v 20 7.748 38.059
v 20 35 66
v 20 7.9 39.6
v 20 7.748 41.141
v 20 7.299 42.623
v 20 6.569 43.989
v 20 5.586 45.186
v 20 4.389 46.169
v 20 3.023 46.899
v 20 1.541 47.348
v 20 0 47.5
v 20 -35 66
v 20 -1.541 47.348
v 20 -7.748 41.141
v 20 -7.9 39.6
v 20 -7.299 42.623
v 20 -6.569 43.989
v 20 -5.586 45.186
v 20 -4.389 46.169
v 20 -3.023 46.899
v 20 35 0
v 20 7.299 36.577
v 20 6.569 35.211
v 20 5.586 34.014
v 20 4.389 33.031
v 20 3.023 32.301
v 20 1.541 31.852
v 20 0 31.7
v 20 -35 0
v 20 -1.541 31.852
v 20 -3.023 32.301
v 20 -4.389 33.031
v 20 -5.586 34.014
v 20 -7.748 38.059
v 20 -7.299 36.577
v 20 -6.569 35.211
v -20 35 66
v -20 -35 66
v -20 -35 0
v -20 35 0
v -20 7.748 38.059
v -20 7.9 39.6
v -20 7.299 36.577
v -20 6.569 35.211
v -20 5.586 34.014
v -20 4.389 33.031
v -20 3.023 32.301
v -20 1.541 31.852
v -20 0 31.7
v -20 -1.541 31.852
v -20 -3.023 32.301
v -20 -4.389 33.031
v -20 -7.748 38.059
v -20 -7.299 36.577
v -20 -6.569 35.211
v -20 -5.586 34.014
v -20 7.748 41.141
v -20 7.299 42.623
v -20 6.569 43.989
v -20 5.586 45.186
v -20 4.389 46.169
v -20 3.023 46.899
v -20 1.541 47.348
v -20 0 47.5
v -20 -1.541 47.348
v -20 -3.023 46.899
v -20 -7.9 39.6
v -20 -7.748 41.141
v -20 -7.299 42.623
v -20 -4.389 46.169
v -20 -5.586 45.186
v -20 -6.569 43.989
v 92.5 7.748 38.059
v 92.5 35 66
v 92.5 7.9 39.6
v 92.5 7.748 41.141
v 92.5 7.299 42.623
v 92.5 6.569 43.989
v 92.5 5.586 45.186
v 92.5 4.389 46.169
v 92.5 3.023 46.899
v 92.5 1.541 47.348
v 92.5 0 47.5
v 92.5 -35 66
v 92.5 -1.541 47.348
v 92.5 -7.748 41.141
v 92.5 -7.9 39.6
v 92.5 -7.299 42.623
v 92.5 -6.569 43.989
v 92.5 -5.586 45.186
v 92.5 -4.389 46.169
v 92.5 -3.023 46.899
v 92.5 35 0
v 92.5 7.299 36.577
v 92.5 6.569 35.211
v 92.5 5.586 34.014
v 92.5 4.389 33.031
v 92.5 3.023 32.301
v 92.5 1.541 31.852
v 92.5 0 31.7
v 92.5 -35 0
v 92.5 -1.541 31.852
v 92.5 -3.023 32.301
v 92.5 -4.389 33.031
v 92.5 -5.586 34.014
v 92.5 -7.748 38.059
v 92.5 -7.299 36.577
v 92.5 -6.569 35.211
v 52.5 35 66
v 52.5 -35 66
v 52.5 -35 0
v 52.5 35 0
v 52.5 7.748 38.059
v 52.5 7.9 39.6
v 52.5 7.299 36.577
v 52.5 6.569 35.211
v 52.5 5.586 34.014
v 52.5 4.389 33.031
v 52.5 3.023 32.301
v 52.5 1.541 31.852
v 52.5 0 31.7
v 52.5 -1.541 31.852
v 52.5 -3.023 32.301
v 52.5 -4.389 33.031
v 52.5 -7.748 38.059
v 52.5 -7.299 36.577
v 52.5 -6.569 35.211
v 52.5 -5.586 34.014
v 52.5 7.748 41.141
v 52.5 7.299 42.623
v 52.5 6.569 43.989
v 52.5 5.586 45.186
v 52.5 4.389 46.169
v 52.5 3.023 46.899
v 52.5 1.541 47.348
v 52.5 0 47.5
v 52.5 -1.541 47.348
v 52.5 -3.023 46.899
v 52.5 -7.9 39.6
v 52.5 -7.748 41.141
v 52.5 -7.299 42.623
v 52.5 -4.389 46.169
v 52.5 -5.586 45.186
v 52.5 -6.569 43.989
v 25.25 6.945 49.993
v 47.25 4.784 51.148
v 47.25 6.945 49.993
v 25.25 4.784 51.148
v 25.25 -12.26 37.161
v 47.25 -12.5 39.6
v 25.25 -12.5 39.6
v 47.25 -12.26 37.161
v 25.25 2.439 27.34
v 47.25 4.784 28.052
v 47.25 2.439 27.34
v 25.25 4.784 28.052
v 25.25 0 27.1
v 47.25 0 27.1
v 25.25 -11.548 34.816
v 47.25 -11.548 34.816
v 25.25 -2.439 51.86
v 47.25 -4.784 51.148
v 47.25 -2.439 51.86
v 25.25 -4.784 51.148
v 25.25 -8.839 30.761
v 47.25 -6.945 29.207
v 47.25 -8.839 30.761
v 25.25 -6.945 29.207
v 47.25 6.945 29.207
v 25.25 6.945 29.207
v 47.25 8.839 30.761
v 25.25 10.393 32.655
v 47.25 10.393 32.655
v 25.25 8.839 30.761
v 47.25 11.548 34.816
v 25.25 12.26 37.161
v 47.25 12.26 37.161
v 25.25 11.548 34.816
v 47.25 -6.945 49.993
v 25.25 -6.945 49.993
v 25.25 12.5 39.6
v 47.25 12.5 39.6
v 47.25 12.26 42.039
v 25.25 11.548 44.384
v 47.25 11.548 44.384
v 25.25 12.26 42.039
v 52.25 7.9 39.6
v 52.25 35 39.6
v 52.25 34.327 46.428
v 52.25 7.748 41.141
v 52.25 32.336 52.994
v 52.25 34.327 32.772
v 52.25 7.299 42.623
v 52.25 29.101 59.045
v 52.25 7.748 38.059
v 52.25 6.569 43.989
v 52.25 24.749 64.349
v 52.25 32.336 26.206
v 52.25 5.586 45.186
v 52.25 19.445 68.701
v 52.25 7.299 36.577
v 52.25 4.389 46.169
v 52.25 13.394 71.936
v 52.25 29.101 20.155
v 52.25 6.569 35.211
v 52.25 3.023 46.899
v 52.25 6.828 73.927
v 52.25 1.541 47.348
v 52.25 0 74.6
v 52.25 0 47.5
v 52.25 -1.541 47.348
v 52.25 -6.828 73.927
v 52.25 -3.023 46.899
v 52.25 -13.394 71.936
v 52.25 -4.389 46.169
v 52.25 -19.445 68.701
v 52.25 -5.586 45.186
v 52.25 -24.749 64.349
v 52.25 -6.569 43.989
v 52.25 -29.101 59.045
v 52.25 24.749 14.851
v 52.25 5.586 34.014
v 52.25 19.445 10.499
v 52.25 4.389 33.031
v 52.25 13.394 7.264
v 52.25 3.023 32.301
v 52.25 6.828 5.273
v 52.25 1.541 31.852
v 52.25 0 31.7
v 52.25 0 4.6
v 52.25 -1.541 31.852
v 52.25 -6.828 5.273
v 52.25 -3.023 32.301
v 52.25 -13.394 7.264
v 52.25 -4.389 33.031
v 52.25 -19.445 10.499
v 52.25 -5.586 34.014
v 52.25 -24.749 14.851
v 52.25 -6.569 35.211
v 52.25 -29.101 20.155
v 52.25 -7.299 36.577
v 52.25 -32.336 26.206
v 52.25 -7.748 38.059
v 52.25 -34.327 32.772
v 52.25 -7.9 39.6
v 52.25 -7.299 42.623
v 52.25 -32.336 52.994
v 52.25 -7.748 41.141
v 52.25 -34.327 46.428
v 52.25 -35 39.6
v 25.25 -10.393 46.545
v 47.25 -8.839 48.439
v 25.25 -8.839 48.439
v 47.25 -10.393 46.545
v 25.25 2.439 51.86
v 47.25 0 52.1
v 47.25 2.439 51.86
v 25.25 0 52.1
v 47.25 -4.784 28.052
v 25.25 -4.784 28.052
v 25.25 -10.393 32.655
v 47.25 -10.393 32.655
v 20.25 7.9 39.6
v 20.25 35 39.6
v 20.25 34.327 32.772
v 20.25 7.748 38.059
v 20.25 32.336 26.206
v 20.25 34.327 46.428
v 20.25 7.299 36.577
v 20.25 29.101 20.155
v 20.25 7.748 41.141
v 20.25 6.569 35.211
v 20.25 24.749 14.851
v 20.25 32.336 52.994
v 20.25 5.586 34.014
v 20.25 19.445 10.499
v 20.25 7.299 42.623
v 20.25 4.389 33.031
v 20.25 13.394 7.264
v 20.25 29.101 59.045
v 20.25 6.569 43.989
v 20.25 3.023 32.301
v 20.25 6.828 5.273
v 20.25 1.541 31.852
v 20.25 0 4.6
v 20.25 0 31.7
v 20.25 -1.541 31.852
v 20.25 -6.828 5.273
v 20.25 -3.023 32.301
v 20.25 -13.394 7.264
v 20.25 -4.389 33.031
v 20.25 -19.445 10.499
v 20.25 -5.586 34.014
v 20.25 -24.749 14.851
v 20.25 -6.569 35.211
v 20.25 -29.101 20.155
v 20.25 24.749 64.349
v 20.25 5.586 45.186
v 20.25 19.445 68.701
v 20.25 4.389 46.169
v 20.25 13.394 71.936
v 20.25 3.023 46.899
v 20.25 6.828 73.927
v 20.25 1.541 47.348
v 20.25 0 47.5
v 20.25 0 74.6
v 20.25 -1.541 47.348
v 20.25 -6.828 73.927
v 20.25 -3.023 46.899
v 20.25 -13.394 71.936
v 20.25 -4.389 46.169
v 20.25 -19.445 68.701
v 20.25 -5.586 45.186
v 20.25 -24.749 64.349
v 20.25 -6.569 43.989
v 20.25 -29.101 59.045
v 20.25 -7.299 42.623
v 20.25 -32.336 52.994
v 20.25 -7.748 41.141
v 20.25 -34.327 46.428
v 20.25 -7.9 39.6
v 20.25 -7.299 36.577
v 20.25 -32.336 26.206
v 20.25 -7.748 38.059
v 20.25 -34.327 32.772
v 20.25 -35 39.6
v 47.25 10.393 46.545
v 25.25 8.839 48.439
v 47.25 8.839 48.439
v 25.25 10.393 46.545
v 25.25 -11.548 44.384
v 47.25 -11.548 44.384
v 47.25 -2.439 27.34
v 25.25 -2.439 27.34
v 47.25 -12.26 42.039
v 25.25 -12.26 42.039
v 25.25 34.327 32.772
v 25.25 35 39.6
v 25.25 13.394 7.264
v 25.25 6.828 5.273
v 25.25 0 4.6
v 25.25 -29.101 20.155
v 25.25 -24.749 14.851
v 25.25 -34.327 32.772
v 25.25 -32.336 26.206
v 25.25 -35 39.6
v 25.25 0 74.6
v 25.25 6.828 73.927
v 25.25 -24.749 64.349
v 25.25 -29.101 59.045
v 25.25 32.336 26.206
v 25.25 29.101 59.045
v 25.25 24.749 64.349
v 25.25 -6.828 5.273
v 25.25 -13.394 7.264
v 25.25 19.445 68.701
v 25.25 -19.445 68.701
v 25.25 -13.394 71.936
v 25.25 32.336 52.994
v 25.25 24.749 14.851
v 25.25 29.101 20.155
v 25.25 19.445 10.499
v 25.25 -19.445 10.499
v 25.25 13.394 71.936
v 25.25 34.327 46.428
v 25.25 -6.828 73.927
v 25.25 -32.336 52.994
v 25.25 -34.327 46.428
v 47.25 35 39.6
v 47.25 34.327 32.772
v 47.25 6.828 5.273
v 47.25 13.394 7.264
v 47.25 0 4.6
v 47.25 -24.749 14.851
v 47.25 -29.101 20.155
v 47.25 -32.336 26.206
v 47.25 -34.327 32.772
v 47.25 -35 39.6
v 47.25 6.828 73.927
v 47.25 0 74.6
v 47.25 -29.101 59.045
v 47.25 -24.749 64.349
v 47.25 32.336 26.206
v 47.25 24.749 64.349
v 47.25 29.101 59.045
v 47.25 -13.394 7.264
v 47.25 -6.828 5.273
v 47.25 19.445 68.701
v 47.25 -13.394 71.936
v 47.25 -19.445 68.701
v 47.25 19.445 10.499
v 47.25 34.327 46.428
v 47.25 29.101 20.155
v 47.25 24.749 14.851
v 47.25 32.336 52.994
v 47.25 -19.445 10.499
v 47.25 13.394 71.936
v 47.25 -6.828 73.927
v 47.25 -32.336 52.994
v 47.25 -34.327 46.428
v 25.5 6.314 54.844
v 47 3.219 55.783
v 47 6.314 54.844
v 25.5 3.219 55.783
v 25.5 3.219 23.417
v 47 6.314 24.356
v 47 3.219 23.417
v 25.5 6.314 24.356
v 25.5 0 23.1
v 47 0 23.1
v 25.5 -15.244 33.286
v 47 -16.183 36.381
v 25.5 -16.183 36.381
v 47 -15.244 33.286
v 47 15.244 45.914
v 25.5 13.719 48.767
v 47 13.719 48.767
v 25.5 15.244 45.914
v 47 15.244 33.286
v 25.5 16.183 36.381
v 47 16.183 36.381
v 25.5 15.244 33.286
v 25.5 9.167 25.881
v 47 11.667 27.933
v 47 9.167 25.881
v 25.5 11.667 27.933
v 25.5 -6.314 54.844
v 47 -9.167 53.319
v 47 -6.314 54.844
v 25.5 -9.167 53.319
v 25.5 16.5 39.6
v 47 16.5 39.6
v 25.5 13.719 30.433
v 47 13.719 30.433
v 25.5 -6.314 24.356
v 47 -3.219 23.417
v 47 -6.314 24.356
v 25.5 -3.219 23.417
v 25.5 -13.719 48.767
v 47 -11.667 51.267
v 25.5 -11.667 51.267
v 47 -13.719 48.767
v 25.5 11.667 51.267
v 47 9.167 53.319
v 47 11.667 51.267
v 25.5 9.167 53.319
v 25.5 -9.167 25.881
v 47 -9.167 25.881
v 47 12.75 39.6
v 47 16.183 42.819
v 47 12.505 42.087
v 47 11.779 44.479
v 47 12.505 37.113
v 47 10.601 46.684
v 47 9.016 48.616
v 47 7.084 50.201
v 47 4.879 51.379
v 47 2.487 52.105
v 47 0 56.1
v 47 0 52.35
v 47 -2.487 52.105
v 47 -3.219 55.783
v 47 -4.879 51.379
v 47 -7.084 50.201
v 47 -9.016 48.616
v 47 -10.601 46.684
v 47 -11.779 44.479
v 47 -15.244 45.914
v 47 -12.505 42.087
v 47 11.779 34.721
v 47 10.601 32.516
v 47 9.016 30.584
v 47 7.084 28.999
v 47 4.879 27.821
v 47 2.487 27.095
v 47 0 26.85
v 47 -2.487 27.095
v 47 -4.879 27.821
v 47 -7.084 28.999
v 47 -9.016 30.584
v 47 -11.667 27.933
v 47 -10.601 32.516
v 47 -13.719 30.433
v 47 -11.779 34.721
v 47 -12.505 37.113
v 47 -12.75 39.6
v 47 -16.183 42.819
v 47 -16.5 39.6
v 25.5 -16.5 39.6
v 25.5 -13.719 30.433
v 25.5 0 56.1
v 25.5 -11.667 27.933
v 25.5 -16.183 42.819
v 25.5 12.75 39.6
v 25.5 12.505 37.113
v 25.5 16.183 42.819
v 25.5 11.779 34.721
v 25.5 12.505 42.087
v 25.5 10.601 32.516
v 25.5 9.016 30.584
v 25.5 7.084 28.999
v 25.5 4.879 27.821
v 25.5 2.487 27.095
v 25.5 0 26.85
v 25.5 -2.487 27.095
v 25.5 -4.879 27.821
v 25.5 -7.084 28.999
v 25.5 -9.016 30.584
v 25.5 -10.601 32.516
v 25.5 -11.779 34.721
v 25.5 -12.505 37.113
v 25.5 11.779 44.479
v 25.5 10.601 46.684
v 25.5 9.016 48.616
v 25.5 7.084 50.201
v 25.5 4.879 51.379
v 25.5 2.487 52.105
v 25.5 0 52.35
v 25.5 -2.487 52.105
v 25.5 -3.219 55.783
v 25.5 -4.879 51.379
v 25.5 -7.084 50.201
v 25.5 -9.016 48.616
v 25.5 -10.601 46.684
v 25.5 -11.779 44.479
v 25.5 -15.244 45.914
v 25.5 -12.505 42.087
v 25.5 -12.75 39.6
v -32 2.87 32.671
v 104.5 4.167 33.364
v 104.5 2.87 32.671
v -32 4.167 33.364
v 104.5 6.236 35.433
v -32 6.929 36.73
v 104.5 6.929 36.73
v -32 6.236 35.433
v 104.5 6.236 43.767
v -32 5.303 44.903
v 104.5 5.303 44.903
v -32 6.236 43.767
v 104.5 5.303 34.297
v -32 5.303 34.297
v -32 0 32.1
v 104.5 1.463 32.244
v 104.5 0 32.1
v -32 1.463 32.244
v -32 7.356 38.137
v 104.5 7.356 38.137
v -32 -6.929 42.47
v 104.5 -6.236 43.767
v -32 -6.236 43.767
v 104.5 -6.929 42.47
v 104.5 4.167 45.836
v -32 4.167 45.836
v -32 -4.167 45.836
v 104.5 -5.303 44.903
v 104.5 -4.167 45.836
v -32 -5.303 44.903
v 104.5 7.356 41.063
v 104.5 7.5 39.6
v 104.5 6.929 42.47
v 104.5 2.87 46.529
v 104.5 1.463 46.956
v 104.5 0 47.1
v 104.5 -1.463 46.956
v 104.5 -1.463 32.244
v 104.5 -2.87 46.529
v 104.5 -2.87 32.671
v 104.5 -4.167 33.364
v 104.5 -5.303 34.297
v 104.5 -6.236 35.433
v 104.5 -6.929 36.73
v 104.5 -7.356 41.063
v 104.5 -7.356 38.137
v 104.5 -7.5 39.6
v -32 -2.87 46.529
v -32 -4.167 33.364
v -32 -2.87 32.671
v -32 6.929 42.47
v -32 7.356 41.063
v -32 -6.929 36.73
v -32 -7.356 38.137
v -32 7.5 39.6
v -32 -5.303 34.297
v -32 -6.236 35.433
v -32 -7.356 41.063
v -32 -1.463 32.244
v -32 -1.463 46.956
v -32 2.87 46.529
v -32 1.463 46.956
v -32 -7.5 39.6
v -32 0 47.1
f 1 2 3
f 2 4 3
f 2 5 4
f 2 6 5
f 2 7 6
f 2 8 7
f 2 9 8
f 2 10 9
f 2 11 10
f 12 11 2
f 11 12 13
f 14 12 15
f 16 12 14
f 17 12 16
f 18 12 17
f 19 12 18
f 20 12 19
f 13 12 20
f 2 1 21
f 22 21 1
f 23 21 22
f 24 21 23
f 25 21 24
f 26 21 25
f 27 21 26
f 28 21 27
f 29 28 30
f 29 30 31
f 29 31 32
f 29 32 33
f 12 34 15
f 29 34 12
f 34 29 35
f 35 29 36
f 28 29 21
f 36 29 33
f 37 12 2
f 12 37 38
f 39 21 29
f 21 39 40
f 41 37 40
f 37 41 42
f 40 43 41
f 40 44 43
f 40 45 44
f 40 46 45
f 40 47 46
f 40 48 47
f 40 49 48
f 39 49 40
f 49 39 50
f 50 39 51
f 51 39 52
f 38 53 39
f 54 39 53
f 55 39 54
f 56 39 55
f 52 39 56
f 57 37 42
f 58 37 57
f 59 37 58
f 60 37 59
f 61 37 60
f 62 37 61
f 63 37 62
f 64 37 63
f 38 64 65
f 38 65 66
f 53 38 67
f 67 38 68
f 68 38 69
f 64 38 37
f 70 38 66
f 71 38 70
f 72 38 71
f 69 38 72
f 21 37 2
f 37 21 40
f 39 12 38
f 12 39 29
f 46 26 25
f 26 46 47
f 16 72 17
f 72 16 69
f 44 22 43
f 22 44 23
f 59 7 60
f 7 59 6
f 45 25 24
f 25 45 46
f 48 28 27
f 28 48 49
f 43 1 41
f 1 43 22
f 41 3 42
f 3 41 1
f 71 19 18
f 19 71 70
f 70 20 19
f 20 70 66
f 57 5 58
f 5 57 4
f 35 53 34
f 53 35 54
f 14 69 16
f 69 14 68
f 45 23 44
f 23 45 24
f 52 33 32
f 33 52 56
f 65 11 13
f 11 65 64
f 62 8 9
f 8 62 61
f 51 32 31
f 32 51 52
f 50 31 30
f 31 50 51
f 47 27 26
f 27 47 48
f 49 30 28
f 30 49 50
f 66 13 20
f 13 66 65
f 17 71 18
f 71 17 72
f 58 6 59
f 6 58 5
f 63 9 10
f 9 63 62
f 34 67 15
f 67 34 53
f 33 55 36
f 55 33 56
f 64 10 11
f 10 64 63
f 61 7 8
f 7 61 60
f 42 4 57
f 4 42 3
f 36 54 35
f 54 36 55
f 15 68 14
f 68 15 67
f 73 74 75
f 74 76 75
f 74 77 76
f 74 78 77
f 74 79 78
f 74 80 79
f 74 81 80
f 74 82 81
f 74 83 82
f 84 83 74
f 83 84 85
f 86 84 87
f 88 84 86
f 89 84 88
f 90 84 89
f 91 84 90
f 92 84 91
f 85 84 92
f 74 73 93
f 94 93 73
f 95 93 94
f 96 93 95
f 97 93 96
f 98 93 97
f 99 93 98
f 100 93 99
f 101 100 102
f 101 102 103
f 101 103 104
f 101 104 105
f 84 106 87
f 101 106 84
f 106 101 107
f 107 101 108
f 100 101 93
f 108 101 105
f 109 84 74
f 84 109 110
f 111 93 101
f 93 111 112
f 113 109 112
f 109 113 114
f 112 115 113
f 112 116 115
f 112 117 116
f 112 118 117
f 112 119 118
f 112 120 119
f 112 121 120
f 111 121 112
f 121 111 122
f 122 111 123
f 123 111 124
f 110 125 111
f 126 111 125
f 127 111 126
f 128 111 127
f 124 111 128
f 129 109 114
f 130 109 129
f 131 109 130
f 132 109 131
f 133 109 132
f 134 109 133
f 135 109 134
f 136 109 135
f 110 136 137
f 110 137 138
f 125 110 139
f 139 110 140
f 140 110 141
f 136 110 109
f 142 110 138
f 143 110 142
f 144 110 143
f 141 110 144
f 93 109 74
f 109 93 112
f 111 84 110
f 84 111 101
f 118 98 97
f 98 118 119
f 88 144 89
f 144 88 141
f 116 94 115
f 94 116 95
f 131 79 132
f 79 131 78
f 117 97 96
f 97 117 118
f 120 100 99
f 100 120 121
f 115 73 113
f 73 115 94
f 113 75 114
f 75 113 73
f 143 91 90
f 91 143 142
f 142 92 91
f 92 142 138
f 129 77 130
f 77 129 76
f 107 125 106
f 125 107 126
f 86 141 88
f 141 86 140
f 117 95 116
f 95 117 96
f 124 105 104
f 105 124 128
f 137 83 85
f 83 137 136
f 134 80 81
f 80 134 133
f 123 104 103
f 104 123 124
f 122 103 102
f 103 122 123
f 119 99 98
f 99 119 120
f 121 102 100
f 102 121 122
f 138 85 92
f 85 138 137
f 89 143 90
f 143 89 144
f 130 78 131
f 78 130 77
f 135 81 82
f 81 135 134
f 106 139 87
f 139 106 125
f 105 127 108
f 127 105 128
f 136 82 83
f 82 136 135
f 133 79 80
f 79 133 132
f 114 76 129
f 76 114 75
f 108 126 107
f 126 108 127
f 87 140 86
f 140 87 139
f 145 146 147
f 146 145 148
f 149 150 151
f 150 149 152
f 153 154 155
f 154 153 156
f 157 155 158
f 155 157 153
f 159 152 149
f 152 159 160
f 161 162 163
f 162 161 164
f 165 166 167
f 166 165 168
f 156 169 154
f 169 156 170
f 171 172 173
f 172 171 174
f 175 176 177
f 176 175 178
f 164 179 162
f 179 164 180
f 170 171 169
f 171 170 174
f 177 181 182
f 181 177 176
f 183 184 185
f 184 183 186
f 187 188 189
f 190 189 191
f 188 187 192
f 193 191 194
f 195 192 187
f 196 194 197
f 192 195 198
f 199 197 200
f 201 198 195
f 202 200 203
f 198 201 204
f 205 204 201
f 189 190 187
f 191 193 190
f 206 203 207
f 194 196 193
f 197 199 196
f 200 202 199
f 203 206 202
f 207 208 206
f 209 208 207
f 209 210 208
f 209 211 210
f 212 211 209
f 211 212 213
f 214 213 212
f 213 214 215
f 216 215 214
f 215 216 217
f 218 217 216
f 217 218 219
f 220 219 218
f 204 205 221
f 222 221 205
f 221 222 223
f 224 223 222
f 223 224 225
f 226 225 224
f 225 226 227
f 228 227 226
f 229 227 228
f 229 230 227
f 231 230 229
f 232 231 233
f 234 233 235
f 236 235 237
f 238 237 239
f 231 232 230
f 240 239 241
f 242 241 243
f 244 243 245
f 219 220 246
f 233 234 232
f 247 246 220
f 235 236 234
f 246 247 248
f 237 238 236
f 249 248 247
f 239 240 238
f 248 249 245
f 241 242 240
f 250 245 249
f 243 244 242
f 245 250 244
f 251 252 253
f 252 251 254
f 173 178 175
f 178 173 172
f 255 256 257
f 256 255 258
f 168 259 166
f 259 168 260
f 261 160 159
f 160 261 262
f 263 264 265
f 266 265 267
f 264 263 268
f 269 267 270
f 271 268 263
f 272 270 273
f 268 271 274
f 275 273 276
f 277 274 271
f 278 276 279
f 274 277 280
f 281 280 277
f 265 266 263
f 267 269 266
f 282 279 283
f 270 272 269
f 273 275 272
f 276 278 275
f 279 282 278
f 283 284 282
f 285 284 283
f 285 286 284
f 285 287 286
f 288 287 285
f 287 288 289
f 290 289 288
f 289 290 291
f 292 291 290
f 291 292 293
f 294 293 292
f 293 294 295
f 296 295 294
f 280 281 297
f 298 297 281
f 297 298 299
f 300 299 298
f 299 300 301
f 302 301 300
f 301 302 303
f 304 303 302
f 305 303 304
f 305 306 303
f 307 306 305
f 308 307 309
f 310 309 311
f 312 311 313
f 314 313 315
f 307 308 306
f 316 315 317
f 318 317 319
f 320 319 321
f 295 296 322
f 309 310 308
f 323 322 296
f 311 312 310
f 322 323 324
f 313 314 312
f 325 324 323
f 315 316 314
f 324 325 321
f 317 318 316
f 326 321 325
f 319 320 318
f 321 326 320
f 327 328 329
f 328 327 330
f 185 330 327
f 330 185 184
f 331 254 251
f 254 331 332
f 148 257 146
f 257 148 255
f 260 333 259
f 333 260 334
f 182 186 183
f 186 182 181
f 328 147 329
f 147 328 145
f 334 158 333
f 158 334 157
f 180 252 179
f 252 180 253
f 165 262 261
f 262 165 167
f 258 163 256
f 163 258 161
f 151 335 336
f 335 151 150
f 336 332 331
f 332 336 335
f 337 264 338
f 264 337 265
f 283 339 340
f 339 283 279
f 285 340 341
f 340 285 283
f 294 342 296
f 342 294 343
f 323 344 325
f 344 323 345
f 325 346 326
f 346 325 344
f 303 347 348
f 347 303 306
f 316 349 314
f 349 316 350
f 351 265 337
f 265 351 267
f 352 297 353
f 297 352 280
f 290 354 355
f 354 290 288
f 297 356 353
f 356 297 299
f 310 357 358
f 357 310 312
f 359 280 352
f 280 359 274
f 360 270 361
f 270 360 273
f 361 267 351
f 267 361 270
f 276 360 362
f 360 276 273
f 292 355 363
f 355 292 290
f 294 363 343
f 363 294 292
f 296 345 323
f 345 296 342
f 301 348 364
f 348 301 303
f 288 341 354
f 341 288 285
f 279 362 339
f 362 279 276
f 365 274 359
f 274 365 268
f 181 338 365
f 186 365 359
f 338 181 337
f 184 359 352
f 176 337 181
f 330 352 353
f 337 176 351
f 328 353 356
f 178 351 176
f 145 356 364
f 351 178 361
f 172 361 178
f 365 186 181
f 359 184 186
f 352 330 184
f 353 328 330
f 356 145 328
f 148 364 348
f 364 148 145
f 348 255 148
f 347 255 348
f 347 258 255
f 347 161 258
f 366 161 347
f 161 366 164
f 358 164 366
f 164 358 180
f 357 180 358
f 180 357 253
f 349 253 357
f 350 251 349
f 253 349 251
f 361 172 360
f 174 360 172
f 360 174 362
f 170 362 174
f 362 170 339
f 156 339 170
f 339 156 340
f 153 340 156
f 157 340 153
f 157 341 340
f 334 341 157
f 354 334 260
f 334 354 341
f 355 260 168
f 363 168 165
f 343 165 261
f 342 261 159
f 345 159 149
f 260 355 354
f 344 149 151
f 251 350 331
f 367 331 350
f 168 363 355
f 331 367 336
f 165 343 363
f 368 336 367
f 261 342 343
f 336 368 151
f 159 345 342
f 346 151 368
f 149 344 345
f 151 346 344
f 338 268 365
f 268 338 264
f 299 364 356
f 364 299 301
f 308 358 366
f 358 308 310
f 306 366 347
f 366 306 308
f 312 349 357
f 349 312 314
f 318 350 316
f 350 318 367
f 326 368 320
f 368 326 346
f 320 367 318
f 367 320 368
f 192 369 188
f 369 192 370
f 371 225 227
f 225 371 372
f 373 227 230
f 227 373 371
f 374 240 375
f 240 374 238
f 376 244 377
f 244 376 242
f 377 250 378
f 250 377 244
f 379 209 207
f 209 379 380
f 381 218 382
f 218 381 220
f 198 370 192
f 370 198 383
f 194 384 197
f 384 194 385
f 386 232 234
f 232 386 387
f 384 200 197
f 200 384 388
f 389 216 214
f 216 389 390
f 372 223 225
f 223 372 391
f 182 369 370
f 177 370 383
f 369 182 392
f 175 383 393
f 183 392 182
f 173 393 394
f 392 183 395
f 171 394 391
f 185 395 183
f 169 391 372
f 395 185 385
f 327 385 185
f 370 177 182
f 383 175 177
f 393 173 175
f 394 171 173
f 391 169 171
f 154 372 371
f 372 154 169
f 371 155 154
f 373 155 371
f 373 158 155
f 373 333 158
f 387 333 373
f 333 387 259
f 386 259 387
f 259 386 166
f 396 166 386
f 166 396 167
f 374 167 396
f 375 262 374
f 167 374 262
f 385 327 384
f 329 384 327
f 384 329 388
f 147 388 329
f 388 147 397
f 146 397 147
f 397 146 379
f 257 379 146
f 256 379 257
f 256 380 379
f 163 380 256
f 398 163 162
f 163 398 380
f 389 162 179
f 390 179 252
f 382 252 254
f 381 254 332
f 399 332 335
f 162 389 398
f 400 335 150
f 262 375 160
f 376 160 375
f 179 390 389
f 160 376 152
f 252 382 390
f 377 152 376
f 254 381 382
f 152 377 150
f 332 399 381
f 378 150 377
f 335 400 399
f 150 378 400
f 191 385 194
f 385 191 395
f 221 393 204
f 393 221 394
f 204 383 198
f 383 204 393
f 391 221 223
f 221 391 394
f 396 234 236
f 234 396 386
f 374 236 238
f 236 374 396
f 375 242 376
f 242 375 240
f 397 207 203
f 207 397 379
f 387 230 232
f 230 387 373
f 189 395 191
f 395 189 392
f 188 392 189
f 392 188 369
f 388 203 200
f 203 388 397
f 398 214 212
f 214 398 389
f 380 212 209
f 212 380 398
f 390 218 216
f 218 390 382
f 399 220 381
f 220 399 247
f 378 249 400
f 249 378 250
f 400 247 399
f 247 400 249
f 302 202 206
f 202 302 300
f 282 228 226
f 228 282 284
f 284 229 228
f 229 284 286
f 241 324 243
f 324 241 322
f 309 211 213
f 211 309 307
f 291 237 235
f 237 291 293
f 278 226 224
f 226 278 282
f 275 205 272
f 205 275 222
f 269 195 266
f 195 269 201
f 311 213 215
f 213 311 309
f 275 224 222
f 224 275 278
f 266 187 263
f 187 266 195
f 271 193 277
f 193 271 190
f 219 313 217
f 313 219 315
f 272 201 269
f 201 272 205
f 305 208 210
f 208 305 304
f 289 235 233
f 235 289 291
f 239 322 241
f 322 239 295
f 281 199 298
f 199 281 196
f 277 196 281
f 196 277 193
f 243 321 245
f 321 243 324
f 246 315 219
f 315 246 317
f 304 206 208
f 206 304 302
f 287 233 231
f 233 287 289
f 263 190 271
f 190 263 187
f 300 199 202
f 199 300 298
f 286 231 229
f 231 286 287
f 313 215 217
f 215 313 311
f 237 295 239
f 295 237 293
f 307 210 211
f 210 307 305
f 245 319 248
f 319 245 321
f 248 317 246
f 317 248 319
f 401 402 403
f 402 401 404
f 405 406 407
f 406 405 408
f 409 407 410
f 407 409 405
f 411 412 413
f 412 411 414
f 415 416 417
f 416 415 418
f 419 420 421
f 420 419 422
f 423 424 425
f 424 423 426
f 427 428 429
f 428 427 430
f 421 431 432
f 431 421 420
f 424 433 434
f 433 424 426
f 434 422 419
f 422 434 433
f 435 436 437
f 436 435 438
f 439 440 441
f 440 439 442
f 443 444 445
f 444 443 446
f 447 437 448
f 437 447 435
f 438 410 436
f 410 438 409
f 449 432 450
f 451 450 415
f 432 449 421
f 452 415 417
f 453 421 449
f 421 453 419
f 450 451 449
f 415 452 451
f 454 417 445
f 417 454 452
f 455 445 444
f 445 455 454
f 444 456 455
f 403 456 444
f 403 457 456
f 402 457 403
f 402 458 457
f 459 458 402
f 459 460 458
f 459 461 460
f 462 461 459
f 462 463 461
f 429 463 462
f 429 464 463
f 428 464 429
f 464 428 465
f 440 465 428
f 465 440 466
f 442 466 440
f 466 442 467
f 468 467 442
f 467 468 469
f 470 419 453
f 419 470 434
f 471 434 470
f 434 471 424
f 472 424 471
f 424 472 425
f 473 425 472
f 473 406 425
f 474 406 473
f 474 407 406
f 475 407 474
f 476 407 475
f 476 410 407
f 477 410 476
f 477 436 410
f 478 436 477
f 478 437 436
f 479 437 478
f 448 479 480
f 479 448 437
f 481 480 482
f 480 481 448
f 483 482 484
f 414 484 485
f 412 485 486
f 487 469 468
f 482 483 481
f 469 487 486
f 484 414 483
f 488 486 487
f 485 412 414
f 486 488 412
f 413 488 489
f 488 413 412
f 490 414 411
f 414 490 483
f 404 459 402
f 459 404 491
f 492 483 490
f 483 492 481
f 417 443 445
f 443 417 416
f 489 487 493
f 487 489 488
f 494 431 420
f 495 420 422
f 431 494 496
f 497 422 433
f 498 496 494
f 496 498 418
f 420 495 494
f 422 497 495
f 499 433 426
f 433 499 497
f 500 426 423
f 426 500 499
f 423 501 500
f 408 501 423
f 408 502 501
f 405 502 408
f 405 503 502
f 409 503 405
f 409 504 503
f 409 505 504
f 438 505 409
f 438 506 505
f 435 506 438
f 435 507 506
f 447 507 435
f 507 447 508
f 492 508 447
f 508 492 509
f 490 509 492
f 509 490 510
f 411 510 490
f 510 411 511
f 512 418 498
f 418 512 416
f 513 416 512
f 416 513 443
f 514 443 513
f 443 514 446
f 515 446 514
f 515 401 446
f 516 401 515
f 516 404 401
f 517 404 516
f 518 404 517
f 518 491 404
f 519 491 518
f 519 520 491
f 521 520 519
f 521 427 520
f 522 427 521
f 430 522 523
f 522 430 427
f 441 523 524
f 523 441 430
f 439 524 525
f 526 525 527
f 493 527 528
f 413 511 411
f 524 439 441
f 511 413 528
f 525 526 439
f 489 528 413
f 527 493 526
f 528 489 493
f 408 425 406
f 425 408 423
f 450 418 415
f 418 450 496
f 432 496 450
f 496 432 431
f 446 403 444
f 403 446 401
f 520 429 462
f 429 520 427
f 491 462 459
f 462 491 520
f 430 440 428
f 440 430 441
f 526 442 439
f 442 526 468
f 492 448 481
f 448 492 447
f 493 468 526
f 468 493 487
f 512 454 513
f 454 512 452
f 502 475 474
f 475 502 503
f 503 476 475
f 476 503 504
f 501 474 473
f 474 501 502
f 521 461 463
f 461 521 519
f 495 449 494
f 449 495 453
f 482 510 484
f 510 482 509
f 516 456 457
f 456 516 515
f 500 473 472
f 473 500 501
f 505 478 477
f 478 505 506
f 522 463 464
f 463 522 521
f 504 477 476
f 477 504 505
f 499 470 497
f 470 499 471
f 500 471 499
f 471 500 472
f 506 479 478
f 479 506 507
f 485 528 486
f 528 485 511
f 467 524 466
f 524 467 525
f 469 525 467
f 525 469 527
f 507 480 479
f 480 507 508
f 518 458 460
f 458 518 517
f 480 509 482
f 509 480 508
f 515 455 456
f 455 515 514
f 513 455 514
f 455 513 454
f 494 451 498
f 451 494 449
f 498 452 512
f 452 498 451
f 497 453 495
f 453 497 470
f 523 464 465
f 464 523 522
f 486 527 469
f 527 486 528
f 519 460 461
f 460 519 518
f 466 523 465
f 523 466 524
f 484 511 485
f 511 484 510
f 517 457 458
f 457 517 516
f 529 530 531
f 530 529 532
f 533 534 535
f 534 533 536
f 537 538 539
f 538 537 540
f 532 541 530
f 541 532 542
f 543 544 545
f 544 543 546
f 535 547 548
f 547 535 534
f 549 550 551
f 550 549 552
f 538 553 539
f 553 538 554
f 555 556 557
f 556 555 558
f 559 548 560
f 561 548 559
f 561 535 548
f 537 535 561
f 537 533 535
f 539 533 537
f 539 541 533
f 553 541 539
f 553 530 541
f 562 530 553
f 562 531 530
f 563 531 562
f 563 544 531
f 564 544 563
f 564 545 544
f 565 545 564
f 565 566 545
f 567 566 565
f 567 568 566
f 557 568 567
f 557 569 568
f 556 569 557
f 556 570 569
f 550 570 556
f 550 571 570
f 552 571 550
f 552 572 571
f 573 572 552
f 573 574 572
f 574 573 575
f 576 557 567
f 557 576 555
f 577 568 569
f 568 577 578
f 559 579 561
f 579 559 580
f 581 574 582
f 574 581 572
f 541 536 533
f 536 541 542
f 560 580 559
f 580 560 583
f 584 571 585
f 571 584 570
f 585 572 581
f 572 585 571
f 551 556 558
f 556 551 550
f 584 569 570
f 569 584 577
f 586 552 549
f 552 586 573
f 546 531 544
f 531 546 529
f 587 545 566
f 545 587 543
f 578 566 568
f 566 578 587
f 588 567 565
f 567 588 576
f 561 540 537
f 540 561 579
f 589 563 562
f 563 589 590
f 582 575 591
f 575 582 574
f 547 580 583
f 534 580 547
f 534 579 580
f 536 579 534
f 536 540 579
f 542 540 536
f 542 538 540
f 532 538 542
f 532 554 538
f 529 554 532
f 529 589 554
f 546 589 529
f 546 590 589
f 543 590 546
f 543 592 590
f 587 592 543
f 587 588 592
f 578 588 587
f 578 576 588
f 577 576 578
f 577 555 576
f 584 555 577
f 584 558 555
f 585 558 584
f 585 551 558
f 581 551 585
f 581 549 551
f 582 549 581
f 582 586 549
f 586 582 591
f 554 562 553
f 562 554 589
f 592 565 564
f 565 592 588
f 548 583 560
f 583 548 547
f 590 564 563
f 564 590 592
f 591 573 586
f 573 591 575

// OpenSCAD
$fn = 32;

// ------------------------------------------------------------------------
// Pulley assembly: d70 pulley with a belt, shaft d15
// Every part is its own module, assembly() places them once.
// ------------------------------------------------------------------------

// --- part 1 ---
module support1() {
  difference() {
    translate([-20, -35, 0]) cube([40, 70, 66]);
    translate([0, 0, 39.6]) rotate([0, 90, 0]) cylinder(h = 42, d = 15.8, center = true);
  }
}

// --- part 2 ---
module support2() {
  difference() {
    translate([-20, -35, 0]) cube([40, 70, 66]);
    translate([0, 0, 39.6]) rotate([0, 90, 0]) cylinder(h = 42, d = 15.8, center = true);
  }
}

// --- part 3 ---
module shaft() {
  translate([0, 0, -68.25]) cylinder(h = 136.5, d = 15);
}

// --- part 4 ---
module pulley() {
  difference() {
    union() {
      cylinder(h = 32, d = 25);
      cylinder(h = 5, d = 70);
      translate([0, 0, 27]) cylinder(h = 5, d = 70);
    }
    translate([0, 0, -1]) cylinder(h = 34, d = 15.8);
  }
}

// --- part 5 ---
module belt() {
  difference() {
      translate([0, 0, 0]) cylinder(h = 21.5, d = 33);
      translate([0, 0, -1]) cylinder(h = 23.5, d = 25.5);
    }
}

// --- assembly ---
module assembly() {
  translate([0, 0, 0]) rotate([0, 0, 0]) support1();
  translate([72.5, 0, 0]) rotate([0, 0, 0]) support2();
  translate([36.25, 0, 39.6]) rotate([0, 90, 0]) shaft();
  translate([20.25, 0, 39.6]) rotate([0, 90, 0]) pulley();
  translate([25.5, 0, 39.6]) rotate([0, 90, 0]) belt();
}

assembly();
